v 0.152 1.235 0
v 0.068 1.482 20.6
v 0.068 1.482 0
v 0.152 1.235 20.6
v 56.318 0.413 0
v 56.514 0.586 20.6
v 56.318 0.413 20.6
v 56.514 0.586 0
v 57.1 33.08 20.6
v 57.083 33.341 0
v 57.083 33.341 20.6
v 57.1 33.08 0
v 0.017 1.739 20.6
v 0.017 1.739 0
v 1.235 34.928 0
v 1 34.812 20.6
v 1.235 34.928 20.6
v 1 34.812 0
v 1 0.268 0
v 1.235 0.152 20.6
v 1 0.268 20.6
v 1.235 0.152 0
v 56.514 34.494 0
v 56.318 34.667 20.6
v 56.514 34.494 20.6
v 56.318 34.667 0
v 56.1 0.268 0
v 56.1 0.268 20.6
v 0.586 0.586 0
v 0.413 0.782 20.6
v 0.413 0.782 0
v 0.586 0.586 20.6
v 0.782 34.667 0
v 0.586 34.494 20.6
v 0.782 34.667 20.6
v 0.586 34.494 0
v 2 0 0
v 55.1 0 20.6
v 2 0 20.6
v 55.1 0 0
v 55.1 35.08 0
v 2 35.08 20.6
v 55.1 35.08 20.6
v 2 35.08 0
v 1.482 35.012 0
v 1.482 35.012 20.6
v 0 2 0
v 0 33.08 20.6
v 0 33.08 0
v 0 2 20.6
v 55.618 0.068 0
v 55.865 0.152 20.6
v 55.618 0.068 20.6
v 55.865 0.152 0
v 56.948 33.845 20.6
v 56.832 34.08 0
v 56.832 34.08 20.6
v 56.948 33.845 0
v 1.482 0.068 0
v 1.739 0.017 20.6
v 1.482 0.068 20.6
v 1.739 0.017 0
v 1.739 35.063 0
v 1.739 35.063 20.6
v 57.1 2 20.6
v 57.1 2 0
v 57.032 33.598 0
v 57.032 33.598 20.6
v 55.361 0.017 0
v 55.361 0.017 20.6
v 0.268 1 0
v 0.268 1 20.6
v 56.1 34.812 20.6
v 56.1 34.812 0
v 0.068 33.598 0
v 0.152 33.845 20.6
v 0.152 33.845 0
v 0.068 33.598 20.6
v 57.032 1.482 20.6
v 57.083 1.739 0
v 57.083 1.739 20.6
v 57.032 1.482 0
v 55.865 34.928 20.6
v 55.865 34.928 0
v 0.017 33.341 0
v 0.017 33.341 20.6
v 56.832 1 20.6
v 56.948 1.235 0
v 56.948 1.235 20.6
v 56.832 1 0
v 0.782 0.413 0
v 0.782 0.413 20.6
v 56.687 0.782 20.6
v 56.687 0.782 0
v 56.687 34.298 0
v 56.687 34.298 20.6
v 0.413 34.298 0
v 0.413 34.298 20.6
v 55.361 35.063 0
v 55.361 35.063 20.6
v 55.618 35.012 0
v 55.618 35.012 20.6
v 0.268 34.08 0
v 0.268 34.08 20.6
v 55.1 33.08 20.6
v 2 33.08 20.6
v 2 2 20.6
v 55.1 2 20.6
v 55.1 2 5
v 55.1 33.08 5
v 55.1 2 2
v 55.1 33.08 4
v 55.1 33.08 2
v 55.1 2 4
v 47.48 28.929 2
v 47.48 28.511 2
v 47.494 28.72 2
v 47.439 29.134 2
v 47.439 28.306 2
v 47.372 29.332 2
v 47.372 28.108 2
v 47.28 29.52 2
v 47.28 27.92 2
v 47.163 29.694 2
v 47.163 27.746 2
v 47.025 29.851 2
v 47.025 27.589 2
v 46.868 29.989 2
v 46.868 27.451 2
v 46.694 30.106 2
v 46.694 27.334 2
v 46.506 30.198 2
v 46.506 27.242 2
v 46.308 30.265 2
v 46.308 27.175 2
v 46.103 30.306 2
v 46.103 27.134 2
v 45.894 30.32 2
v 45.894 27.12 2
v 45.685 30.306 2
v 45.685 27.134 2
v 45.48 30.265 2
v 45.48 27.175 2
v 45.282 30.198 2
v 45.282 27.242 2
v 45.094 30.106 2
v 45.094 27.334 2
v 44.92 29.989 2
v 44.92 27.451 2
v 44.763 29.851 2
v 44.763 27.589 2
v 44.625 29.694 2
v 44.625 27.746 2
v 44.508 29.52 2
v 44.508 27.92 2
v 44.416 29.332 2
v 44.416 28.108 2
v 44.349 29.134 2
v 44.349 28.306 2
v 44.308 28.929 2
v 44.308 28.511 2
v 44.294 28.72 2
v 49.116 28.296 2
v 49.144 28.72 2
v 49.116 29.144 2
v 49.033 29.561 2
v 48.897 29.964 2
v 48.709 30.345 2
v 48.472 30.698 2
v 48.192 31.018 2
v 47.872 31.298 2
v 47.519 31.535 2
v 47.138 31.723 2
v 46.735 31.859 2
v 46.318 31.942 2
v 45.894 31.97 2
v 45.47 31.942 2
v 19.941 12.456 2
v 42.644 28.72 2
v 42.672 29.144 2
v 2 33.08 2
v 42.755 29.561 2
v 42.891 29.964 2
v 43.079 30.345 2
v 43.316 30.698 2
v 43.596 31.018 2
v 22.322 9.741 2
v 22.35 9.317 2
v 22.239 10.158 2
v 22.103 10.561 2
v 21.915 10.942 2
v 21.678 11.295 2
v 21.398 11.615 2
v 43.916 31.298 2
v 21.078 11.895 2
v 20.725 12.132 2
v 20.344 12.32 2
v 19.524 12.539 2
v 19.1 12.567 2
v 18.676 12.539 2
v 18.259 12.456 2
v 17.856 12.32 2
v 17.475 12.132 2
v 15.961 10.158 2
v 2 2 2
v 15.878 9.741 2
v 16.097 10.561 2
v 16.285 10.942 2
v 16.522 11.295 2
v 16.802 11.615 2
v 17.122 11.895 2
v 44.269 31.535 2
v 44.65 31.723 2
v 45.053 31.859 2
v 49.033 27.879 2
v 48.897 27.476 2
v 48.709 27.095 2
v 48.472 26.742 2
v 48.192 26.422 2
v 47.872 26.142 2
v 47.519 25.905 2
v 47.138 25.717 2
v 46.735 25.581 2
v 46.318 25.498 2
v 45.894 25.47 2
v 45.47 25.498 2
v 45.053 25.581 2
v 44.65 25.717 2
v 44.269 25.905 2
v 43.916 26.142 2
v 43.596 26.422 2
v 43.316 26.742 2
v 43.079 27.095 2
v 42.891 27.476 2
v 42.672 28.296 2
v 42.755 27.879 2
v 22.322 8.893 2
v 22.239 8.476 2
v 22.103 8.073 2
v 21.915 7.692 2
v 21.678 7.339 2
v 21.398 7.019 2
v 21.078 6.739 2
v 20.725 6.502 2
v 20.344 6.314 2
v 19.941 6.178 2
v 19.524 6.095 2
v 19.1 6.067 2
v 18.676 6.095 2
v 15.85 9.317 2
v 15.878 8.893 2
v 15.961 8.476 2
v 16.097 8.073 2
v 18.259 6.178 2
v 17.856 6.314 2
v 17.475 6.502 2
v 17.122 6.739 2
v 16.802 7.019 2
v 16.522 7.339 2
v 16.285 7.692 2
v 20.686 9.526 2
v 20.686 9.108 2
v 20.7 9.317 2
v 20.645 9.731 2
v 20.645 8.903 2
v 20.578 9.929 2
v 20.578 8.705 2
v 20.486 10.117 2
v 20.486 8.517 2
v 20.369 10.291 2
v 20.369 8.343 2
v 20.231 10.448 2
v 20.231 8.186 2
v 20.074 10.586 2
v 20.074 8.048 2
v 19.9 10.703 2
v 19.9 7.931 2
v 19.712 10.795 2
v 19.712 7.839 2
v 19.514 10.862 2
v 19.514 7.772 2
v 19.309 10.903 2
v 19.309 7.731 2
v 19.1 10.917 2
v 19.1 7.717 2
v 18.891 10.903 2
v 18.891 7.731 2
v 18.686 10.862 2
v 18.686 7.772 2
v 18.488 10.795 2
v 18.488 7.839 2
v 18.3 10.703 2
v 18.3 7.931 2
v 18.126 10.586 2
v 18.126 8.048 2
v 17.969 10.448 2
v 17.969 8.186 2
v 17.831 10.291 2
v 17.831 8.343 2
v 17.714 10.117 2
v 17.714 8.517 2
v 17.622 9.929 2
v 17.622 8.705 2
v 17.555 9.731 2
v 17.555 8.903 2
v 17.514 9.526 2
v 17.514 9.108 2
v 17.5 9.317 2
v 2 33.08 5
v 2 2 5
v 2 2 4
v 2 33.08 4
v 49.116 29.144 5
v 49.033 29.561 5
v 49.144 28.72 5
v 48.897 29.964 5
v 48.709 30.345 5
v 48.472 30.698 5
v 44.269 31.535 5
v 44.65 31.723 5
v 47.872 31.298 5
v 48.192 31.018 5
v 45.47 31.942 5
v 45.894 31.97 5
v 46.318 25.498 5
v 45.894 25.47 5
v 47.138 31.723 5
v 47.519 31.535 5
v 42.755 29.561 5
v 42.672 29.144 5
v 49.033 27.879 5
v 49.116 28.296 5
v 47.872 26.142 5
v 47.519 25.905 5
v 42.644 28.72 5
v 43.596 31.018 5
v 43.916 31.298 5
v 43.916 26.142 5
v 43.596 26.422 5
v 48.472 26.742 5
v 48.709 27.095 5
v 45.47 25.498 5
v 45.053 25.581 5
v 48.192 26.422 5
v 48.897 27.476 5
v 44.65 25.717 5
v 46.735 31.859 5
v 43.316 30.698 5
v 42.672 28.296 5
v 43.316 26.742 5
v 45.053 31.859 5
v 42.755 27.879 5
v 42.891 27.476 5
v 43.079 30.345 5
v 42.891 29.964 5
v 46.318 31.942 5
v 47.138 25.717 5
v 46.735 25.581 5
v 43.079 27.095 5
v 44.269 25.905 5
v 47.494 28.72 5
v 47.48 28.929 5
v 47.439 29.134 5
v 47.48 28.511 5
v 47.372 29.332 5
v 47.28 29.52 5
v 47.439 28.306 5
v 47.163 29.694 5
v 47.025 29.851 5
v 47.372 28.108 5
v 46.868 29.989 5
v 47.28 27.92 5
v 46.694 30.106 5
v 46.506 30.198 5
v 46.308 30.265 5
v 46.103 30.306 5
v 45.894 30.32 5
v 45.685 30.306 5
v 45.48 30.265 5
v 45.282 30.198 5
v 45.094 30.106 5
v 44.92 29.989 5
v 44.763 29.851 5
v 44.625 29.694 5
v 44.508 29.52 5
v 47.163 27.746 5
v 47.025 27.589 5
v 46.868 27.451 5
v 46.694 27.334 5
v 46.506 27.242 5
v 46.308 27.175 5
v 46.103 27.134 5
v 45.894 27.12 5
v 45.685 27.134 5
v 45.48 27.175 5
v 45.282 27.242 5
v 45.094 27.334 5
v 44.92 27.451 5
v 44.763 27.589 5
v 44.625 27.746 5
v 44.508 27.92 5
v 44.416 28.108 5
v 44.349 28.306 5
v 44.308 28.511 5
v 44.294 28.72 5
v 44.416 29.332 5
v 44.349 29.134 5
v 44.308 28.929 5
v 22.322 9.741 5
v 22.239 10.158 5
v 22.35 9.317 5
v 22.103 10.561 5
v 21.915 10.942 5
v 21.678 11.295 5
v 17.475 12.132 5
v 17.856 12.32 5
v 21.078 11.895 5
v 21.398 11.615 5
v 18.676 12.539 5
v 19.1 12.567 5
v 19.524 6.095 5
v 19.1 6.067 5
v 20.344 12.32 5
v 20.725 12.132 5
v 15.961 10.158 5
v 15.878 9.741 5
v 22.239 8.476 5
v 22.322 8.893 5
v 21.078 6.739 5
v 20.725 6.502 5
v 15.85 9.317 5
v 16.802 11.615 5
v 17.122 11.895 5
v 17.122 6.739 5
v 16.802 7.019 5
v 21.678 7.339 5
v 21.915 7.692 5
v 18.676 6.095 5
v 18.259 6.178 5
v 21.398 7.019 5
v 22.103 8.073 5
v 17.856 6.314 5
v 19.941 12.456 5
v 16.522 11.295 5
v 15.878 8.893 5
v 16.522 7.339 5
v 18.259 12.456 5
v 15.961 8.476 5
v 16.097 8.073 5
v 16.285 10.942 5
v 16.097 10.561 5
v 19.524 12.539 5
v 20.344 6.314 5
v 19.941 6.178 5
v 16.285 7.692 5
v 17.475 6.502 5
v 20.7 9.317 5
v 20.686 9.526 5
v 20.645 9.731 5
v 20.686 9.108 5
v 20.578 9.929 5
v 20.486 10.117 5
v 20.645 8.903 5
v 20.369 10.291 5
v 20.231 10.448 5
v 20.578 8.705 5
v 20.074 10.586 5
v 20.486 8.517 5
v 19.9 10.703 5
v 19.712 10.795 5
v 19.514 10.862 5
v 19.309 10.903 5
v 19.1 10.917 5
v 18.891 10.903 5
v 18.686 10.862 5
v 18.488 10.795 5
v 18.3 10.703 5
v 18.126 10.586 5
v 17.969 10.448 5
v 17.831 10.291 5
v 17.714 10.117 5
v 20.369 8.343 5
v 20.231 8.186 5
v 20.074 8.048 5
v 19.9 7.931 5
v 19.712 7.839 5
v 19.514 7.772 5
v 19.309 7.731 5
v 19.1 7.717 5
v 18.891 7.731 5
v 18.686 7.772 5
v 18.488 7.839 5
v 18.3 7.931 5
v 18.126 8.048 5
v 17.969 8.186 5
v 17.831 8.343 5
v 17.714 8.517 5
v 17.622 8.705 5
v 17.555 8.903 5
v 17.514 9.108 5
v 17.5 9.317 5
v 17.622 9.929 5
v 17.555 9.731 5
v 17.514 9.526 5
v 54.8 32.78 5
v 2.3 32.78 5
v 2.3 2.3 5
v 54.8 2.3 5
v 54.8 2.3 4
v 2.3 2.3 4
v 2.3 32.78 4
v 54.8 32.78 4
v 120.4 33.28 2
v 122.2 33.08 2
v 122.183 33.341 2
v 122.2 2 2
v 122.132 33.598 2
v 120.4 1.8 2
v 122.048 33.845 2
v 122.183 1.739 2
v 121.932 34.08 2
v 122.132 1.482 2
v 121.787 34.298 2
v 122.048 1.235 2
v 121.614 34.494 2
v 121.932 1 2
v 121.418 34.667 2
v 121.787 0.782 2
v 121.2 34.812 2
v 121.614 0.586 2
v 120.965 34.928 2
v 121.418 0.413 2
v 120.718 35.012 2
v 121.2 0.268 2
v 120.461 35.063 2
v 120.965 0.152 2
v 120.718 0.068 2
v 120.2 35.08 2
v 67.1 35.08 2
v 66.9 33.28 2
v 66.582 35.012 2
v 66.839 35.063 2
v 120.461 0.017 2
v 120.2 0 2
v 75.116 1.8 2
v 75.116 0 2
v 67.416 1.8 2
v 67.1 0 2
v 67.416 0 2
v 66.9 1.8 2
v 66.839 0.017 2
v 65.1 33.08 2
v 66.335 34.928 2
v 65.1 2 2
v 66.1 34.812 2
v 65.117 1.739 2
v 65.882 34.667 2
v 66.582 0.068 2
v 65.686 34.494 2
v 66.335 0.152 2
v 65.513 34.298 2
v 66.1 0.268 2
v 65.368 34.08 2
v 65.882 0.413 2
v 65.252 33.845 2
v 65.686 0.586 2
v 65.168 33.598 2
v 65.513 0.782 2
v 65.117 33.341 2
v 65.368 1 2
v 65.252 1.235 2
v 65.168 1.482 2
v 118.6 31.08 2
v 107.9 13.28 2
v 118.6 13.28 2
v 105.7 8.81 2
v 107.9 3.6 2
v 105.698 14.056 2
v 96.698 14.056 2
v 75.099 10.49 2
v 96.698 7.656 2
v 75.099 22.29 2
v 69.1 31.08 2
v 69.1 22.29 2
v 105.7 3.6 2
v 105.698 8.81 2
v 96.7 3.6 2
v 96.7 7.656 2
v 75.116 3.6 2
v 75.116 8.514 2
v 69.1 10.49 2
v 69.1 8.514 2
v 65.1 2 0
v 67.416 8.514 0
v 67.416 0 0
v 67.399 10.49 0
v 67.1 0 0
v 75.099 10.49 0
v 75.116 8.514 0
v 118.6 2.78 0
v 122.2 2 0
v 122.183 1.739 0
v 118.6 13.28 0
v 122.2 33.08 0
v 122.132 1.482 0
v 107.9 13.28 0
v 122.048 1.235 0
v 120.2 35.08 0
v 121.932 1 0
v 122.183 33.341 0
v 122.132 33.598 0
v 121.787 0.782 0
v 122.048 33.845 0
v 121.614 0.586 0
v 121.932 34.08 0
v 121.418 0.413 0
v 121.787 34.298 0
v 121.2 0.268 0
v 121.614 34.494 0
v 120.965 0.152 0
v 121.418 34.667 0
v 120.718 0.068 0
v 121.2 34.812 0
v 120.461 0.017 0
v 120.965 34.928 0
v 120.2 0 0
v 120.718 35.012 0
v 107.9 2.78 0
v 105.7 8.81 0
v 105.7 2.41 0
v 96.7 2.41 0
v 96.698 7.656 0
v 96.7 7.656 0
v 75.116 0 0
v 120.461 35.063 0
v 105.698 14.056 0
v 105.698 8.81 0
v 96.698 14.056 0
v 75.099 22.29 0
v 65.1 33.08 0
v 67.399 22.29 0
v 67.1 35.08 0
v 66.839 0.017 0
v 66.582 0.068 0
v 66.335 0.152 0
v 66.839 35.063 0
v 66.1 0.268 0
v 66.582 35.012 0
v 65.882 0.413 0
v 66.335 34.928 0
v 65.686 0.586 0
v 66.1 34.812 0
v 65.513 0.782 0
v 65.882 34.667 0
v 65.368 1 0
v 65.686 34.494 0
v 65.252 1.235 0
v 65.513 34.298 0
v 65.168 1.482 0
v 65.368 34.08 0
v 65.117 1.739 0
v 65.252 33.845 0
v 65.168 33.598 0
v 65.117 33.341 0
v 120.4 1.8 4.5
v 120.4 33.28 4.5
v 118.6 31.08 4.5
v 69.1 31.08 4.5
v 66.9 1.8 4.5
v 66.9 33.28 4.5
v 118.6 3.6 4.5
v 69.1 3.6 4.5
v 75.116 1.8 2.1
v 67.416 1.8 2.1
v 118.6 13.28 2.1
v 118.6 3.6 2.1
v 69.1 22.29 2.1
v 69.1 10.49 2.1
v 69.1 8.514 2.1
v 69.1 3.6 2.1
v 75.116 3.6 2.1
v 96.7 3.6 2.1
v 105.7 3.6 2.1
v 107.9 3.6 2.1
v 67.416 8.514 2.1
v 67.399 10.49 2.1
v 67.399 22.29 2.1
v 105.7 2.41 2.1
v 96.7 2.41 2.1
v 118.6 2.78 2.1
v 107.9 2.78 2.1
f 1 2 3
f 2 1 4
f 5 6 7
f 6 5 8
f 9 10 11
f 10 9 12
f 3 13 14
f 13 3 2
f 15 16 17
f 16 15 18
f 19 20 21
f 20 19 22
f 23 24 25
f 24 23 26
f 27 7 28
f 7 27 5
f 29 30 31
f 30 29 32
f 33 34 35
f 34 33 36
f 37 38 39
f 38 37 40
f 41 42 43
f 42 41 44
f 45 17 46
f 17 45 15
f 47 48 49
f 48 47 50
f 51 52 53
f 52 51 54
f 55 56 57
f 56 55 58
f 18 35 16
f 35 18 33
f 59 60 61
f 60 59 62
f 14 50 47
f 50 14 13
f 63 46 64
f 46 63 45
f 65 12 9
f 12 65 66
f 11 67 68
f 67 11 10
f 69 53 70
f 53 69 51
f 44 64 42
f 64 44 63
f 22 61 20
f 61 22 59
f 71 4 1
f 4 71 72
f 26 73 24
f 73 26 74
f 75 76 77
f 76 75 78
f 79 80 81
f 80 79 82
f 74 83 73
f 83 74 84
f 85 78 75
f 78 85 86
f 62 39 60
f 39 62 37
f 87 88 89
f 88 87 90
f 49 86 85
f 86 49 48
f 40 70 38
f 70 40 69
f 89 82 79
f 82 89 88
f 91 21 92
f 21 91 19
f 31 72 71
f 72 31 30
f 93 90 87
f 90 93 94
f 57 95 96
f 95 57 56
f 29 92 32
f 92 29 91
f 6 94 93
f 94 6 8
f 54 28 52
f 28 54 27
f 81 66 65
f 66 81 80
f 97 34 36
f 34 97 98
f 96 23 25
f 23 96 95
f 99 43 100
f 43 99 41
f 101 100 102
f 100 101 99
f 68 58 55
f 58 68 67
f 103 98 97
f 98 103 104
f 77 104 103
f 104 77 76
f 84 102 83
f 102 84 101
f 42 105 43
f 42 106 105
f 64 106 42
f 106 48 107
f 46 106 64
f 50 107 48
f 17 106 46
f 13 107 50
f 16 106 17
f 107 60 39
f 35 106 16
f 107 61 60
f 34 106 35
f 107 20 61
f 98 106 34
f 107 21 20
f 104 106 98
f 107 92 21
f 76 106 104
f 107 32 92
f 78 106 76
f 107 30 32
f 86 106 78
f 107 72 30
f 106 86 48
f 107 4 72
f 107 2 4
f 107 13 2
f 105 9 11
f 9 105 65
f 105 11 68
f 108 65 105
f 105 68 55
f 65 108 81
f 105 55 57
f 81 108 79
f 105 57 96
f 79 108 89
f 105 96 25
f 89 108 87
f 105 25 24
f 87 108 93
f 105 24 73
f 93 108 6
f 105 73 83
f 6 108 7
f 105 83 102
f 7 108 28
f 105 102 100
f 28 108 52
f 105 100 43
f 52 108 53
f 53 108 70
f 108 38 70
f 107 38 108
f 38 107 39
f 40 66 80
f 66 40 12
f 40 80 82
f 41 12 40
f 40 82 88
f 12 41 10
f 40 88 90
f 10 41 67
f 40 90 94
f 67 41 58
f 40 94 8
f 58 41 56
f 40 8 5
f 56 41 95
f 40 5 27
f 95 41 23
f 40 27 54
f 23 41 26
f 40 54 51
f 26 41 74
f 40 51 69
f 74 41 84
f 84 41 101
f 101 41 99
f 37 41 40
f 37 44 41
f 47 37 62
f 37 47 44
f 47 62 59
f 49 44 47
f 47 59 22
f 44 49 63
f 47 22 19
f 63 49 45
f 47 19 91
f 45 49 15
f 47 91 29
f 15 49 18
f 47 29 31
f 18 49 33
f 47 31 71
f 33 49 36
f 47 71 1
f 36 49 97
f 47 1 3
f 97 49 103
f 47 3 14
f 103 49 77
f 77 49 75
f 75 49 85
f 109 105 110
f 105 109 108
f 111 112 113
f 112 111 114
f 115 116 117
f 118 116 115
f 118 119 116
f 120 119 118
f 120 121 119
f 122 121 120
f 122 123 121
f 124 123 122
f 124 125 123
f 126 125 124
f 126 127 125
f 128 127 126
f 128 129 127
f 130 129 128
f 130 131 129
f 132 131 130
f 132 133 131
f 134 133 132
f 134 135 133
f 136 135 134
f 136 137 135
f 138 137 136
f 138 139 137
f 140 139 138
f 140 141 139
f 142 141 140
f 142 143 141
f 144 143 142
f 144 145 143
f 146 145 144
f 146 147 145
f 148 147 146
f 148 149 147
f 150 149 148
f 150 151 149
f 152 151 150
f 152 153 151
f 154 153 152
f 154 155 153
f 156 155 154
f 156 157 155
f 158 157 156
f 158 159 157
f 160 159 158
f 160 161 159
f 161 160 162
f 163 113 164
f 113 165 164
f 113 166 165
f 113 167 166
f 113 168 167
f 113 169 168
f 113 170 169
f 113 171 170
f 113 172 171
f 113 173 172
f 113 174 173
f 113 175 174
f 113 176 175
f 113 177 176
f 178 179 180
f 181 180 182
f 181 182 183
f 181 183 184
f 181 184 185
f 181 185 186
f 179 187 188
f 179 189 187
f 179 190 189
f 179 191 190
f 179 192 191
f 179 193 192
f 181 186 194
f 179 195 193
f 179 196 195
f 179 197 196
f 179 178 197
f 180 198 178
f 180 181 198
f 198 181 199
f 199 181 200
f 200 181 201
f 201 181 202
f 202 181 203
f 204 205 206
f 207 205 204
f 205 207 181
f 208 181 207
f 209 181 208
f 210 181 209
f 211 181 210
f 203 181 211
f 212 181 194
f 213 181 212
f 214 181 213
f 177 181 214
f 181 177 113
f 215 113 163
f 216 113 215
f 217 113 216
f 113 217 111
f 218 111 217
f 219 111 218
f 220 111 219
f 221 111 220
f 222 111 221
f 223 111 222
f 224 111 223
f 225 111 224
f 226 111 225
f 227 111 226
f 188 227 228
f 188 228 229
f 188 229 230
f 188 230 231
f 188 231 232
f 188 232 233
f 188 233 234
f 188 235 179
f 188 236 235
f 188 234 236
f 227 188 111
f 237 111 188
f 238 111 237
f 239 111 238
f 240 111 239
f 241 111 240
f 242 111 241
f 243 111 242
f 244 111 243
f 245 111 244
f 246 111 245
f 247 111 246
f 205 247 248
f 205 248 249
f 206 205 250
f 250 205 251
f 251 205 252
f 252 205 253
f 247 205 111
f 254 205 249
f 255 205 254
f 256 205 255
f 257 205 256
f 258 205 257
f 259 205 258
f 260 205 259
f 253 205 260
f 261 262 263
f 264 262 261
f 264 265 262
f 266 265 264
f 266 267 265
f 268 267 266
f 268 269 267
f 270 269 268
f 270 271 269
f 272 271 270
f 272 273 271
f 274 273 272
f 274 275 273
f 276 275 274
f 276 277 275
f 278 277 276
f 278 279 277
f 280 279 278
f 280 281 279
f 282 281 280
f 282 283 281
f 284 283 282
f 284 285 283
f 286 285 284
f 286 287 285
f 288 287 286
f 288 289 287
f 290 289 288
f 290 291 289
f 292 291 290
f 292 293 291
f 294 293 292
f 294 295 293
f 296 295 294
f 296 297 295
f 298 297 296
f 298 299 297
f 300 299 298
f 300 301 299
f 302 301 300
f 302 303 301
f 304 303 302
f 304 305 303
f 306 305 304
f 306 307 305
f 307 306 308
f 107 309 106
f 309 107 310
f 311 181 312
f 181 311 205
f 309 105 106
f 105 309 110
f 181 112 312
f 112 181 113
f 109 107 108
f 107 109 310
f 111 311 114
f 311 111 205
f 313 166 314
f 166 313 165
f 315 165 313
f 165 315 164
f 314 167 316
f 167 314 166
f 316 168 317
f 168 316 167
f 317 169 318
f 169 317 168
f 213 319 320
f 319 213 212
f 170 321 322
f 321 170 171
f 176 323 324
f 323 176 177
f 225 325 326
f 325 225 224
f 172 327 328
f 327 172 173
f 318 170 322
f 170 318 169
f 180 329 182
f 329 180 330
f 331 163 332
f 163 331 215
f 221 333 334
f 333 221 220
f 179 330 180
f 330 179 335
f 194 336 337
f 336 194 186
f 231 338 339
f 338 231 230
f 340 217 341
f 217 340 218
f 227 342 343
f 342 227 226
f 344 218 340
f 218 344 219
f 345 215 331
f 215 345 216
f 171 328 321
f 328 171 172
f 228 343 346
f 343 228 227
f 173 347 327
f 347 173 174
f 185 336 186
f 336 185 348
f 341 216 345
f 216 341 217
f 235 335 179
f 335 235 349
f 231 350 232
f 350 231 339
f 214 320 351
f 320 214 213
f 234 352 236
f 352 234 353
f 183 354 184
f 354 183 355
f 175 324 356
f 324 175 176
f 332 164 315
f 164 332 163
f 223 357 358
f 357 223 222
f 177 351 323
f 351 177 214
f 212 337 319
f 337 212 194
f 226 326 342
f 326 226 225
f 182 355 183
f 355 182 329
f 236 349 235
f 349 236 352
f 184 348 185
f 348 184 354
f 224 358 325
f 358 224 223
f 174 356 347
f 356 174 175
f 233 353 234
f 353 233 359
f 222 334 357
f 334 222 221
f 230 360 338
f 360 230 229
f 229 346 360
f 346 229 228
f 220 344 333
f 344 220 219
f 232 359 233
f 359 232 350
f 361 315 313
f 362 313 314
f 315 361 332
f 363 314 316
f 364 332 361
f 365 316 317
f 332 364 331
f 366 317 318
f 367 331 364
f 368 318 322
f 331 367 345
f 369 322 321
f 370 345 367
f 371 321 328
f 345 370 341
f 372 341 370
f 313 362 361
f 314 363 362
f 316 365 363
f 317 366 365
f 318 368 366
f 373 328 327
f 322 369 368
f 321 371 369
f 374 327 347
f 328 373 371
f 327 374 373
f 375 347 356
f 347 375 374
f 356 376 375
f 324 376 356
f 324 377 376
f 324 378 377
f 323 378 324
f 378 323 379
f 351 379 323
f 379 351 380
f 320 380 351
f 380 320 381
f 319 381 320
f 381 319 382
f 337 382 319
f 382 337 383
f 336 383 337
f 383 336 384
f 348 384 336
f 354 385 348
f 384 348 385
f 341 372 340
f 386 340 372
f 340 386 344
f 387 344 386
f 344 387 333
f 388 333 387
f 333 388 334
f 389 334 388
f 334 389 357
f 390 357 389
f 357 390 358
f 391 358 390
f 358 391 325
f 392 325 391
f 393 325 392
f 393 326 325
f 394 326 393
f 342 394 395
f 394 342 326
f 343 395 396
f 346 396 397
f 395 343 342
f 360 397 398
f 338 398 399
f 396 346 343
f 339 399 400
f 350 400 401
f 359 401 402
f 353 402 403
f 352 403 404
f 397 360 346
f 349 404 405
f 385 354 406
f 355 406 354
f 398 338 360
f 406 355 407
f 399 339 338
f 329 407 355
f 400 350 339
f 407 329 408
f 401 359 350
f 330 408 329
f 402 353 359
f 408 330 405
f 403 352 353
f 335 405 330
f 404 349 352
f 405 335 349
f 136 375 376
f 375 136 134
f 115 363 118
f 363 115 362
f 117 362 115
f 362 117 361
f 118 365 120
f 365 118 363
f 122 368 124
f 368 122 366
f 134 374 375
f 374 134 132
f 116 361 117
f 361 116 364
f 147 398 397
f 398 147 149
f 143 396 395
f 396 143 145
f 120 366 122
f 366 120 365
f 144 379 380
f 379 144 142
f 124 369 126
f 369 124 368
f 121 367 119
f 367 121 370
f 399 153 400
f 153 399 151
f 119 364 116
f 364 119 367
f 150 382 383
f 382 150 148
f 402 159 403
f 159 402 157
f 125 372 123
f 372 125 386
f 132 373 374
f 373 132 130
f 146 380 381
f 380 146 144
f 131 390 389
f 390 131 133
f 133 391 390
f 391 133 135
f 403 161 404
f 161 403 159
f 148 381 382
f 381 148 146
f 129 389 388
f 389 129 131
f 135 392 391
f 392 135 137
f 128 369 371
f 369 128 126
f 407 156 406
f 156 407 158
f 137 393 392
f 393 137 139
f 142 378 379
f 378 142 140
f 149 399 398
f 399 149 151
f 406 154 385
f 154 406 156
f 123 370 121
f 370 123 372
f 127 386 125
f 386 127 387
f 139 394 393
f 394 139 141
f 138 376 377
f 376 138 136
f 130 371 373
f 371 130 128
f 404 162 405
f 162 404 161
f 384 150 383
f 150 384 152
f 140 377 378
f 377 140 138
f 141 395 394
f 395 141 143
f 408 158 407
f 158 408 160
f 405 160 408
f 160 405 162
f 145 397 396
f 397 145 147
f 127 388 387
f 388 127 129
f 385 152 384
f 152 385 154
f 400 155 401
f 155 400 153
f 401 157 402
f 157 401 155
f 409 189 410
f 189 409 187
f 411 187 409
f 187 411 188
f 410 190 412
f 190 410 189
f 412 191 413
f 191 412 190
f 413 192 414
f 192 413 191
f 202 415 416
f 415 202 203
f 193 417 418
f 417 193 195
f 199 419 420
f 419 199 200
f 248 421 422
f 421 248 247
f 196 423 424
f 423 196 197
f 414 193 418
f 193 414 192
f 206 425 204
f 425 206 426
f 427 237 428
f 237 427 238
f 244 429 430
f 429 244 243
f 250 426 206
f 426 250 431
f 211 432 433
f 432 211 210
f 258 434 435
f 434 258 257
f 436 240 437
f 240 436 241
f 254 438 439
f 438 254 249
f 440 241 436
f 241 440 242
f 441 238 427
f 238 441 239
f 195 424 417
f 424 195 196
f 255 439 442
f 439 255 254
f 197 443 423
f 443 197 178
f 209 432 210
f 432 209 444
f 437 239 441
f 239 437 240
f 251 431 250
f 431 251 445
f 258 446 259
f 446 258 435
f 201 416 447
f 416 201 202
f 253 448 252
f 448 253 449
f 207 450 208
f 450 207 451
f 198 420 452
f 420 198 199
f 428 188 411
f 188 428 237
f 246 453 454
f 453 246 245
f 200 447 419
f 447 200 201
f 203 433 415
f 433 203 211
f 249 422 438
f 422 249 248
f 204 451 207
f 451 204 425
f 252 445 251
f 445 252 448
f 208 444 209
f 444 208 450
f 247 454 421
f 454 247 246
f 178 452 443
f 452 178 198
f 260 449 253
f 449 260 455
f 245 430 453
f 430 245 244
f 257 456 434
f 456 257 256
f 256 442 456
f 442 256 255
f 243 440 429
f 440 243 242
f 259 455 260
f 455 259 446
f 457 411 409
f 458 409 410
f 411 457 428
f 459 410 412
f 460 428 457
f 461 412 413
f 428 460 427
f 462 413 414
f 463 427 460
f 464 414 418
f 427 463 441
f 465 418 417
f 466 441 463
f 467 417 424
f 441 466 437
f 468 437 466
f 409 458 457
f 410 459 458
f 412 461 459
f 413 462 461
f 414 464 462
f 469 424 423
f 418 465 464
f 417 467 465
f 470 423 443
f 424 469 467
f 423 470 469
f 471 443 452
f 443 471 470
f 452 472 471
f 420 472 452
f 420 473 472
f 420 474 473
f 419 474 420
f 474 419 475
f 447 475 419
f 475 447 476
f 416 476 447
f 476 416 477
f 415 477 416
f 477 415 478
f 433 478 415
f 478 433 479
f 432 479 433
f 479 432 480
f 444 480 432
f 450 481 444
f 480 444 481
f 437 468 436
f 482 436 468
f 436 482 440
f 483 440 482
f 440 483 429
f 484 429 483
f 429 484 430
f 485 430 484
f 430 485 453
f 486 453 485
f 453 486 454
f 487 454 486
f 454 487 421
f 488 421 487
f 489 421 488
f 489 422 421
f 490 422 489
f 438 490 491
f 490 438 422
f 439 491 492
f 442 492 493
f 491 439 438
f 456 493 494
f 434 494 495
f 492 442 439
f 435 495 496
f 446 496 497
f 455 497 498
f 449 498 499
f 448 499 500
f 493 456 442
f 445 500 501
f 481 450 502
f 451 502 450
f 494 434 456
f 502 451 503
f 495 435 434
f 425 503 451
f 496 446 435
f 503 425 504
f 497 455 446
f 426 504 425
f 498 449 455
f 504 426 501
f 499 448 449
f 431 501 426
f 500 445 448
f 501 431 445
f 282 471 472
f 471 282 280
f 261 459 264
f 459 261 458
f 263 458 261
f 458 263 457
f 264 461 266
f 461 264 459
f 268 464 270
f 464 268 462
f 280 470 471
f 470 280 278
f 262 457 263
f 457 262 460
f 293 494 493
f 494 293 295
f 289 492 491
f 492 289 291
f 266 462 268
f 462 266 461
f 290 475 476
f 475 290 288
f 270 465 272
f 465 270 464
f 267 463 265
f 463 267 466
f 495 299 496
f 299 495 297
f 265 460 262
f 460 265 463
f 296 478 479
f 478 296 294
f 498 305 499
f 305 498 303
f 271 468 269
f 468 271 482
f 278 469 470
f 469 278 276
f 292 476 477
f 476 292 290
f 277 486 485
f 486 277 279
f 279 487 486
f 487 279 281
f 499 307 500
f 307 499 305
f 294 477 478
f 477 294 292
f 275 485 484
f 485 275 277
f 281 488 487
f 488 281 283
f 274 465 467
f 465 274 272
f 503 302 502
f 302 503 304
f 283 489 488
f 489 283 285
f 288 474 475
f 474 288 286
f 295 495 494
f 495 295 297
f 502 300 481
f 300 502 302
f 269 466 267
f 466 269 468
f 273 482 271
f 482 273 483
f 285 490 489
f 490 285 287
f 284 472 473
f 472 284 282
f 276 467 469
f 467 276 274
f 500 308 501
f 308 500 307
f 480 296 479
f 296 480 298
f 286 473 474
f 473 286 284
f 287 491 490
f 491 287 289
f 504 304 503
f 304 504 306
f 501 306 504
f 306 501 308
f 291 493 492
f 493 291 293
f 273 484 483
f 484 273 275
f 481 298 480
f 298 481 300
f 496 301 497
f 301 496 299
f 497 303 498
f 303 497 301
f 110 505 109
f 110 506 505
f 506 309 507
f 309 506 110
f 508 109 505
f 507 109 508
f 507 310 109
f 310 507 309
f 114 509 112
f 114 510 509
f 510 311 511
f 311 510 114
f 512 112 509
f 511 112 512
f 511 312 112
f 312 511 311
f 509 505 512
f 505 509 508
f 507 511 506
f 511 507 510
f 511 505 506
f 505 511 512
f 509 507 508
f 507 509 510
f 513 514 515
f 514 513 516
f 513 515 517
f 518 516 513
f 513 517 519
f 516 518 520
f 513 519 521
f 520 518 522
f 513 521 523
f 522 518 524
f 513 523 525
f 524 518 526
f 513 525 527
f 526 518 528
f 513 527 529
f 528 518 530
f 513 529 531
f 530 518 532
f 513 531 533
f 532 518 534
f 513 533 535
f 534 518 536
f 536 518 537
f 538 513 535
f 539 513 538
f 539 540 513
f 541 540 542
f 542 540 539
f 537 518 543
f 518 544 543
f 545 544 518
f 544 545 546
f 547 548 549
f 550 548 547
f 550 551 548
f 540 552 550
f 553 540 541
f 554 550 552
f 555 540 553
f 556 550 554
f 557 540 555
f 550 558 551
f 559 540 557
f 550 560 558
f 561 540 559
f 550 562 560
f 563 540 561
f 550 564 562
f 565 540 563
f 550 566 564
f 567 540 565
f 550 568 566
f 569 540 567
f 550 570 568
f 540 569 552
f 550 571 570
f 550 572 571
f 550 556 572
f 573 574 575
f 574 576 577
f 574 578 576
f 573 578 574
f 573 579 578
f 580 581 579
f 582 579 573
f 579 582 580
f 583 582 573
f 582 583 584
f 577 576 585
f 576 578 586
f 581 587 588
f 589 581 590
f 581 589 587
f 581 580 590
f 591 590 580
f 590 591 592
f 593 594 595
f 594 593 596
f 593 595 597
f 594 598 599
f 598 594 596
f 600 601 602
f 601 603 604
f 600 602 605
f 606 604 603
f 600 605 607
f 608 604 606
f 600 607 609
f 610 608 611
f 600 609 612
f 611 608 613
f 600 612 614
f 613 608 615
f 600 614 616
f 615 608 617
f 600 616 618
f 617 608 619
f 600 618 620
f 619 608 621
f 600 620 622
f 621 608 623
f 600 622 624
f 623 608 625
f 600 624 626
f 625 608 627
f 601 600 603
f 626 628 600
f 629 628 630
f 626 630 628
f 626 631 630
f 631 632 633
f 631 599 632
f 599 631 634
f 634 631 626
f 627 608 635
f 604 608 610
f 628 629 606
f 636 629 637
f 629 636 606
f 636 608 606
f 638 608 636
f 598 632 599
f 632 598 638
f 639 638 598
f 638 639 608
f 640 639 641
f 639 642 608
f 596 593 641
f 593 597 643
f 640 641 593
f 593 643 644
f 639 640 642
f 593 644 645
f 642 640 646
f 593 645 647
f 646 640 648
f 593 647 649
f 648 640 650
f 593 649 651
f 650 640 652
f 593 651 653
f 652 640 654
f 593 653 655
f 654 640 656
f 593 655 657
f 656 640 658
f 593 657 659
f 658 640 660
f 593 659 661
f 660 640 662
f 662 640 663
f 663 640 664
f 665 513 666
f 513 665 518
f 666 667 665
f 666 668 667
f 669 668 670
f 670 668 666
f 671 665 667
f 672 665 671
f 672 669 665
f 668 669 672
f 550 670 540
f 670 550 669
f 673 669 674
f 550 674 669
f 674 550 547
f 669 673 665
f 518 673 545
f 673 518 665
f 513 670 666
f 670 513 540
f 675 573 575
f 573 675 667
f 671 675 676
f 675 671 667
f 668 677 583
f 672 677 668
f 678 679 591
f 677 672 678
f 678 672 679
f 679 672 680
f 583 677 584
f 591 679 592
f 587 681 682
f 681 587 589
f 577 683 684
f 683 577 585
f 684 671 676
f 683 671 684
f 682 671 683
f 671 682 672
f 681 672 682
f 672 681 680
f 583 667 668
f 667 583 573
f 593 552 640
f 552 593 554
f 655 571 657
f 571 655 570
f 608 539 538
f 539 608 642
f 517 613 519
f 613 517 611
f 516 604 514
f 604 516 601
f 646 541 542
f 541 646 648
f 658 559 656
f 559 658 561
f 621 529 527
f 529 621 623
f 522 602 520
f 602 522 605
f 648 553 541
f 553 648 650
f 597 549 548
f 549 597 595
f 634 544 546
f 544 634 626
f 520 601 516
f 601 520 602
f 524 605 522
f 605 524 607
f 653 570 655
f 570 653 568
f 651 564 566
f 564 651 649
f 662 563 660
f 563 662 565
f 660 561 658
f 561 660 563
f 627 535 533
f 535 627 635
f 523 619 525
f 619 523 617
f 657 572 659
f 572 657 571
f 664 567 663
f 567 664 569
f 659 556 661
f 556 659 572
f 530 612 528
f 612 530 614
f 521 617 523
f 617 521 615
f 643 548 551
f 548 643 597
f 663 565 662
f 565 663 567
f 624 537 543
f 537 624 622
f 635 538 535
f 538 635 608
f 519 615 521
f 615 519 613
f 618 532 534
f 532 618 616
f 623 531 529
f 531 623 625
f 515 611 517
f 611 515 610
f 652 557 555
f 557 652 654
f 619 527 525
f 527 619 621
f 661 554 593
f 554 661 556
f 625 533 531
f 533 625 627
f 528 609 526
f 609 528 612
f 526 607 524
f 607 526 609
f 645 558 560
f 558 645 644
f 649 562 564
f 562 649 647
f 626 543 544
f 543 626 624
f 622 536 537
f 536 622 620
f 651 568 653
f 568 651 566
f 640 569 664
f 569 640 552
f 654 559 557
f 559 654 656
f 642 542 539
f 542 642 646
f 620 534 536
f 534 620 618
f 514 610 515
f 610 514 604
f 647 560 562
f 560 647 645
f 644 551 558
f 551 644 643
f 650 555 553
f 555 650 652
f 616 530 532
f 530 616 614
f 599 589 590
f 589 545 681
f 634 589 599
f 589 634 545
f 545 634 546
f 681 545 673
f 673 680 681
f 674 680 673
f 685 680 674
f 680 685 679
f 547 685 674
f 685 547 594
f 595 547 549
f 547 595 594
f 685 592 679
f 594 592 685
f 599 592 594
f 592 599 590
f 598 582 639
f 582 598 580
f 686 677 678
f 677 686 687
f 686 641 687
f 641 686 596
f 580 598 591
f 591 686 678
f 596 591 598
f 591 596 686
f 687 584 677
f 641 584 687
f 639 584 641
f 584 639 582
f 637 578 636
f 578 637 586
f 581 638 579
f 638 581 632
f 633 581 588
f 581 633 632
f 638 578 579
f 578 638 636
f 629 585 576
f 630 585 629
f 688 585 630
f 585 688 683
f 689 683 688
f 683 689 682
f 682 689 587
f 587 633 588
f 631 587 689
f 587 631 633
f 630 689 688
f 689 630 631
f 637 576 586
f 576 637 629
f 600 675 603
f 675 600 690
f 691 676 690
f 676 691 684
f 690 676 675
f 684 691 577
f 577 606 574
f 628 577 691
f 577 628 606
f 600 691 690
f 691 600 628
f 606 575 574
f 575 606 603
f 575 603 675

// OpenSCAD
// ============================================================
//  KinderLight 2025030502 — Scatola stampabile 3D
//  Generato da dati KiCad reali
//  
//  Struttura:
//    BASE  : vassoio con pareti + pilastri fissaggio PCB (H1,H2)
//            + colonnine angolo per viti M3 chiusura
//    COPERCHIO : pannello con:
//            - fori per xh_i2c, xh_led, ph_led, ph_i2c (connettori JST)
//            - finestra aperta per mkds (Phoenix terminal block)
//            - fori M3 agli angoli per chiusura
//
//  Orientamento: X=lunghezza, Y=larghezza, Z=altezza
//  Origine PCB: angolo in basso a sinistra della board
// ============================================================

// ── Render ──────────────────────────────────────────────────
SHOW = "both";  // "base" | "cover" | "both" | "assembled"
$fn = 48;

// ── Parametri PCB ────────────────────────────────────────────
pcb_x    = 52.5;    // larghezza board
pcb_y    = 30.48;   // profondità board
pcb_z    = 1.6;     // spessore PCB
comp_h   = 14.0;    // altezza massima componenti sopra PCB

// ── Parametri scatola ───────────────────────────────────────
wall     = 2.0;     // spessore pareti
floor_z  = 2.0;     // spessore fondo base
cover_z  = 2.0;     // spessore coperchio
pcb_lift = 3.0;     // distanza PCB dal fondo (altezza pilastri base)
margin   = 0.3;     // gioco laterale PCB in scatola

// Altezza interna utile = pcb_lift + pcb_z + comp_h
inner_h  = pcb_lift + pcb_z + comp_h;  // = 18.6mm

// Dimensioni esterne
ext_x = pcb_x + 2*wall + 2*margin;   // 56.5mm esterno X
ext_y = pcb_y + 2*wall + 2*margin;   // 35.08mm esterno Y
ext_z = floor_z + inner_h + cover_z; // 22.6mm totale Z

// ── Fori di montaggio PCB (coordinate relative board) ───────
// H1 e H2: fori M3, drill=3.2mm
h1_x = 43.594;  h1_y = 26.420;
h2_x = 16.800;  h2_y = 7.017;
mount_drill  = 3.2;   // foro passante
mount_boss_d = 6.5;   // diametro colonnina
mount_boss_h = pcb_lift; // altezza = pcb_lift

// ── Viti chiusura M3 agli angoli ─────────────────────────────
screw_d      = 3.2;   // foro M3
screw_boss_d = 7.0;   // colonnina (raggio=3.5, parete=2 → dentro di 1.5mm OK)
// Le torrette stanno DENTRO le pareti: centro a 4mm dal bordo esterno
// = 2mm parete + 2mm raggio interno → nessuna collisione con PCB
screw_margin = wall + screw_boss_d/2 - 0.5; // = 4.5mm dal bordo ext

// Posizioni colonnine angolo (nel sistema scatola = PCB + offset)
// Le metto agli angoli della base
function corner_pos(i) =
    i == 0 ? [screw_margin,            screw_margin           ] :
    i == 1 ? [ext_x - screw_margin,    screw_margin           ] :
    i == 2 ? [ext_x - screw_margin,    ext_y - screw_margin   ] :
             [screw_margin,            ext_y - screw_margin   ];

// ── Connettori coperchio ─────────────────────────────────────
// xh_i2c: JST XH 4pin, center (3.72, 26.42), rot=90
//   Footprint XH4: ~10mm x 7.5mm → buco 11x8.5mm
// xh_led: JST XH 4pin, center (3.70, 12.64), rot=90
// ph_led: JST PH 4pin, center (30.80, 21.12), rot=0
//   Footprint PH4: ~8mm x 5.5mm → buco 9x6.5mm
// ph_i2c: JST PH 4pin, center (36.80, 27.97), rot=180

// mkds: Phoenix MKDS-1,5-2 Horizontal, bbox x=[40.17,50.98] y=[14.22,25.39]
// Finestra aperta con margine +1mm per lato
mkds_x1 = 40.5;
mkds_x2 = 51.2;
mkds_y1 = 19.5;
mkds_y2 = 30;

// Helper: posizione nel sistema scatola (offset da wall+margin)
function pcb2box_x(px) = px + wall + margin;
function pcb2box_y(py) = py + wall + margin;

// ── Moduli ───────────────────────────────────────────────────

module rounded_box(x, y, z, r=2) {
    hull() {
        for (dx=[r, x-r]) for (dy=[r, y-r])
            translate([dx, dy, 0]) cylinder(h=z, r=r);
    }
}

module screw_boss_base(pos) {
    // Colonnina piena con foro passante M3
    translate([pos[0], pos[1], 0])
        difference() {
            cylinder(d=screw_boss_d, h=floor_z + inner_h);
            translate([0, 0, -0.1])
                cylinder(d=screw_d, h=floor_z + inner_h + 0.2);
        }
}

module screw_boss_cover(pos) {
    // Colonnina coperchio con foro cieco (per vite che viene dalla base)
    translate([pos[0], pos[1], 0])
        difference() {
            cylinder(d=screw_boss_d, h=cover_z);
            translate([0, 0, -0.1])
                cylinder(d=screw_d, h=cover_z + 0.2);
        }
}

module pcb_mount_boss(px, py) {
    // Pilastro per fissaggio PCB con foro M3
    bx = pcb2box_x(px);
    by = pcb2box_y(py);
    translate([bx, by, floor_z])
        difference() {
            cylinder(d=mount_boss_d, h=mount_boss_h);
            translate([0, 0, mount_boss_h - 3.0])  // foro cieco 3mm
                cylinder(d=mount_drill, h=3.1);
        }
}

// Slot centrato sul centro del courtyard globale (non sull'origine footprint!)
// Dimensioni ricavate dai dati KiCad reali + tolleranza 0.5mm per lato
// Nota: il centro del courtyard NON coincide con l'origine del footprint
//       per i JST con rot=90 (corpo asimmetrico rispetto ai pad)

module slot_xh_i2c() {
    // JST XH 4pin, rot=90 — CrtYd center=(3.866, 30.166), size=6.7x10.8mm
    translate([pcb2box_x(3.866) - 3.85, pcb2box_y(30.166) - 5.90, -0.1])
        cube([7.70, 11.80, cover_z + 0.2]);
}

module slot_xh_led() {
    // JST XH 4pin, rot=90 — CrtYd center=(3.849, 16.390), size=6.7x10.8mm
    translate([pcb2box_x(3.849) - 3.85, pcb2box_y(16.390) - 5.90, -0.1])
        cube([7.70, 11.80, cover_z + 0.2]);
}

module slot_ph_led() {
    // JST PH 4pin, rot=0  — CrtYd center=(33.798, 21.924), size=8.0x5.4mm
    translate([pcb2box_x(33.798) - 4.50, pcb2box_y(21.924) - 3.20, -0.1])
        cube([9.00, 6.40, cover_z + 0.2]);
}

module slot_ph_i2c() {
    // JST PH 4pin, rot=180 — CrtYd center=(33.800, 27.170), size=8.0x5.4mm
    translate([pcb2box_x(33.800) - 4.50, pcb2box_y(27.170) - 3.20, -0.1])
        cube([9.00, 6.40, cover_z + 0.2]);
}

// ── BASE ─────────────────────────────────────────────────────
module base() {
    color("SteelBlue", 0.85)
    difference() {
        union() {
            // Corpo principale (pareti + fondo)
            difference() {
                rounded_box(ext_x, ext_y, floor_z + inner_h, r=2);
                // Svuotamento interno
                translate([wall, wall, floor_z])
                    cube([ext_x - 2*wall, ext_y - 2*wall, inner_h + 0.1]);
            }
            
            // Colonnine angolo per viti M3
            //for (i=[0:3]) screw_boss_base(corner_pos(i));
            
            // Pilastri fissaggio PCB H1, H2
            pcb_mount_boss(h1_x, h1_y);
            pcb_mount_boss(h2_x, h2_y);
            
            // Battuta perimetrale per centrare PCB (opzionale, 1mm alta)
            translate([wall, wall, floor_z + pcb_lift - 1])
                difference() {
                    cube([ext_x - 2*wall, ext_y - 2*wall, 1]);
                    translate([margin, margin, -0.1])
                        cube([pcb_x, pcb_y, 1.2]);
                }
        }
        
        // Niente altro da togliere dalla base
    }
}

// ── COPERCHIO ────────────────────────────────────────────────
module cover() {
    color("LightSteelBlue", 0.85)
    difference() {
        union() {
            // Pannello piatto
            rounded_box(ext_x, ext_y, cover_z, r=2);
            // Colonnine angolo
            for (i=[0:3]) screw_boss_cover(corner_pos(i));
            
            // Bordo incastro (lip) che scende nelle pareti della base
            // Aiuta l'allineamento
            translate([wall - 0.2, wall - 0.2, -2.5])
                difference() {
                    cube([ext_x - 2*(wall-0.2), ext_y - 2*(wall-0.2), 2.6]);
                    translate([wall + 0.2, wall + 0.2, -0.1])
                        cube([pcb_x - 2*wall + 2*margin + 0.4,
                              pcb_y - 2*wall + 2*margin + 0.4,
                              2.8]);
                }
        }
        
        // ── Fori connettori ──────────────────────────────────
        slot_xh_i2c();
        slot_xh_led();
        slot_ph_led();
        slot_ph_i2c();
        
        // ── Finestra mkds (Phoenix terminal block) ─────────────
        // Finestra aperta rettangolare con +1mm margine
        translate([pcb2box_x(mkds_x1), pcb2box_y(mkds_y1), -0.1])
            cube([mkds_x2 - mkds_x1,
                  mkds_y2 - mkds_y1,
                  cover_z + 3.0]);  // extra Z per passare anche il corpo
        
        // ── Fori viti M3 ─────────────────────────────────────
        // già rimossi nei boss_cover (foro passante)
    }
}

// ── Assemblaggio / Stampa ────────────────────────────────────

if (SHOW == "base") {
    base();

} else if (SHOW == "cover") {
    // Ruota per stampa (piatto sul piano)
    translate([0, ext_y + 5, cover_z])
        rotate([180, 0, 0])
            cover();

} else if (SHOW == "both") {
    // Fianco a fianco per stampa
    base();
    translate([ext_x + 8, 0, 0]) {
        translate([0, ext_y, cover_z])
            rotate([180, 0, 0])
                cover();
    }

} else if (SHOW == "assembled") {
    // Assemblato
    base();
    translate([0, 0, floor_z + inner_h])
        cover();
}

// ============================================================
//  NOTE:
//  - Pilastri H1/H2: foro M3 cieco 3mm, inserire inserto M3
//    o vite autofilettante M3
//  - Viti angolo: M3x(inner_h + floor_z)mm ~22mm
//  - Lip del coperchio: scende 2.5mm nelle pareti base
//  - mkds finestra: 11.8 x 12.2mm, passa il corpo del Phoenix
//  - Gioco PCB laterale: 0.3mm per lato
// ============================================================
